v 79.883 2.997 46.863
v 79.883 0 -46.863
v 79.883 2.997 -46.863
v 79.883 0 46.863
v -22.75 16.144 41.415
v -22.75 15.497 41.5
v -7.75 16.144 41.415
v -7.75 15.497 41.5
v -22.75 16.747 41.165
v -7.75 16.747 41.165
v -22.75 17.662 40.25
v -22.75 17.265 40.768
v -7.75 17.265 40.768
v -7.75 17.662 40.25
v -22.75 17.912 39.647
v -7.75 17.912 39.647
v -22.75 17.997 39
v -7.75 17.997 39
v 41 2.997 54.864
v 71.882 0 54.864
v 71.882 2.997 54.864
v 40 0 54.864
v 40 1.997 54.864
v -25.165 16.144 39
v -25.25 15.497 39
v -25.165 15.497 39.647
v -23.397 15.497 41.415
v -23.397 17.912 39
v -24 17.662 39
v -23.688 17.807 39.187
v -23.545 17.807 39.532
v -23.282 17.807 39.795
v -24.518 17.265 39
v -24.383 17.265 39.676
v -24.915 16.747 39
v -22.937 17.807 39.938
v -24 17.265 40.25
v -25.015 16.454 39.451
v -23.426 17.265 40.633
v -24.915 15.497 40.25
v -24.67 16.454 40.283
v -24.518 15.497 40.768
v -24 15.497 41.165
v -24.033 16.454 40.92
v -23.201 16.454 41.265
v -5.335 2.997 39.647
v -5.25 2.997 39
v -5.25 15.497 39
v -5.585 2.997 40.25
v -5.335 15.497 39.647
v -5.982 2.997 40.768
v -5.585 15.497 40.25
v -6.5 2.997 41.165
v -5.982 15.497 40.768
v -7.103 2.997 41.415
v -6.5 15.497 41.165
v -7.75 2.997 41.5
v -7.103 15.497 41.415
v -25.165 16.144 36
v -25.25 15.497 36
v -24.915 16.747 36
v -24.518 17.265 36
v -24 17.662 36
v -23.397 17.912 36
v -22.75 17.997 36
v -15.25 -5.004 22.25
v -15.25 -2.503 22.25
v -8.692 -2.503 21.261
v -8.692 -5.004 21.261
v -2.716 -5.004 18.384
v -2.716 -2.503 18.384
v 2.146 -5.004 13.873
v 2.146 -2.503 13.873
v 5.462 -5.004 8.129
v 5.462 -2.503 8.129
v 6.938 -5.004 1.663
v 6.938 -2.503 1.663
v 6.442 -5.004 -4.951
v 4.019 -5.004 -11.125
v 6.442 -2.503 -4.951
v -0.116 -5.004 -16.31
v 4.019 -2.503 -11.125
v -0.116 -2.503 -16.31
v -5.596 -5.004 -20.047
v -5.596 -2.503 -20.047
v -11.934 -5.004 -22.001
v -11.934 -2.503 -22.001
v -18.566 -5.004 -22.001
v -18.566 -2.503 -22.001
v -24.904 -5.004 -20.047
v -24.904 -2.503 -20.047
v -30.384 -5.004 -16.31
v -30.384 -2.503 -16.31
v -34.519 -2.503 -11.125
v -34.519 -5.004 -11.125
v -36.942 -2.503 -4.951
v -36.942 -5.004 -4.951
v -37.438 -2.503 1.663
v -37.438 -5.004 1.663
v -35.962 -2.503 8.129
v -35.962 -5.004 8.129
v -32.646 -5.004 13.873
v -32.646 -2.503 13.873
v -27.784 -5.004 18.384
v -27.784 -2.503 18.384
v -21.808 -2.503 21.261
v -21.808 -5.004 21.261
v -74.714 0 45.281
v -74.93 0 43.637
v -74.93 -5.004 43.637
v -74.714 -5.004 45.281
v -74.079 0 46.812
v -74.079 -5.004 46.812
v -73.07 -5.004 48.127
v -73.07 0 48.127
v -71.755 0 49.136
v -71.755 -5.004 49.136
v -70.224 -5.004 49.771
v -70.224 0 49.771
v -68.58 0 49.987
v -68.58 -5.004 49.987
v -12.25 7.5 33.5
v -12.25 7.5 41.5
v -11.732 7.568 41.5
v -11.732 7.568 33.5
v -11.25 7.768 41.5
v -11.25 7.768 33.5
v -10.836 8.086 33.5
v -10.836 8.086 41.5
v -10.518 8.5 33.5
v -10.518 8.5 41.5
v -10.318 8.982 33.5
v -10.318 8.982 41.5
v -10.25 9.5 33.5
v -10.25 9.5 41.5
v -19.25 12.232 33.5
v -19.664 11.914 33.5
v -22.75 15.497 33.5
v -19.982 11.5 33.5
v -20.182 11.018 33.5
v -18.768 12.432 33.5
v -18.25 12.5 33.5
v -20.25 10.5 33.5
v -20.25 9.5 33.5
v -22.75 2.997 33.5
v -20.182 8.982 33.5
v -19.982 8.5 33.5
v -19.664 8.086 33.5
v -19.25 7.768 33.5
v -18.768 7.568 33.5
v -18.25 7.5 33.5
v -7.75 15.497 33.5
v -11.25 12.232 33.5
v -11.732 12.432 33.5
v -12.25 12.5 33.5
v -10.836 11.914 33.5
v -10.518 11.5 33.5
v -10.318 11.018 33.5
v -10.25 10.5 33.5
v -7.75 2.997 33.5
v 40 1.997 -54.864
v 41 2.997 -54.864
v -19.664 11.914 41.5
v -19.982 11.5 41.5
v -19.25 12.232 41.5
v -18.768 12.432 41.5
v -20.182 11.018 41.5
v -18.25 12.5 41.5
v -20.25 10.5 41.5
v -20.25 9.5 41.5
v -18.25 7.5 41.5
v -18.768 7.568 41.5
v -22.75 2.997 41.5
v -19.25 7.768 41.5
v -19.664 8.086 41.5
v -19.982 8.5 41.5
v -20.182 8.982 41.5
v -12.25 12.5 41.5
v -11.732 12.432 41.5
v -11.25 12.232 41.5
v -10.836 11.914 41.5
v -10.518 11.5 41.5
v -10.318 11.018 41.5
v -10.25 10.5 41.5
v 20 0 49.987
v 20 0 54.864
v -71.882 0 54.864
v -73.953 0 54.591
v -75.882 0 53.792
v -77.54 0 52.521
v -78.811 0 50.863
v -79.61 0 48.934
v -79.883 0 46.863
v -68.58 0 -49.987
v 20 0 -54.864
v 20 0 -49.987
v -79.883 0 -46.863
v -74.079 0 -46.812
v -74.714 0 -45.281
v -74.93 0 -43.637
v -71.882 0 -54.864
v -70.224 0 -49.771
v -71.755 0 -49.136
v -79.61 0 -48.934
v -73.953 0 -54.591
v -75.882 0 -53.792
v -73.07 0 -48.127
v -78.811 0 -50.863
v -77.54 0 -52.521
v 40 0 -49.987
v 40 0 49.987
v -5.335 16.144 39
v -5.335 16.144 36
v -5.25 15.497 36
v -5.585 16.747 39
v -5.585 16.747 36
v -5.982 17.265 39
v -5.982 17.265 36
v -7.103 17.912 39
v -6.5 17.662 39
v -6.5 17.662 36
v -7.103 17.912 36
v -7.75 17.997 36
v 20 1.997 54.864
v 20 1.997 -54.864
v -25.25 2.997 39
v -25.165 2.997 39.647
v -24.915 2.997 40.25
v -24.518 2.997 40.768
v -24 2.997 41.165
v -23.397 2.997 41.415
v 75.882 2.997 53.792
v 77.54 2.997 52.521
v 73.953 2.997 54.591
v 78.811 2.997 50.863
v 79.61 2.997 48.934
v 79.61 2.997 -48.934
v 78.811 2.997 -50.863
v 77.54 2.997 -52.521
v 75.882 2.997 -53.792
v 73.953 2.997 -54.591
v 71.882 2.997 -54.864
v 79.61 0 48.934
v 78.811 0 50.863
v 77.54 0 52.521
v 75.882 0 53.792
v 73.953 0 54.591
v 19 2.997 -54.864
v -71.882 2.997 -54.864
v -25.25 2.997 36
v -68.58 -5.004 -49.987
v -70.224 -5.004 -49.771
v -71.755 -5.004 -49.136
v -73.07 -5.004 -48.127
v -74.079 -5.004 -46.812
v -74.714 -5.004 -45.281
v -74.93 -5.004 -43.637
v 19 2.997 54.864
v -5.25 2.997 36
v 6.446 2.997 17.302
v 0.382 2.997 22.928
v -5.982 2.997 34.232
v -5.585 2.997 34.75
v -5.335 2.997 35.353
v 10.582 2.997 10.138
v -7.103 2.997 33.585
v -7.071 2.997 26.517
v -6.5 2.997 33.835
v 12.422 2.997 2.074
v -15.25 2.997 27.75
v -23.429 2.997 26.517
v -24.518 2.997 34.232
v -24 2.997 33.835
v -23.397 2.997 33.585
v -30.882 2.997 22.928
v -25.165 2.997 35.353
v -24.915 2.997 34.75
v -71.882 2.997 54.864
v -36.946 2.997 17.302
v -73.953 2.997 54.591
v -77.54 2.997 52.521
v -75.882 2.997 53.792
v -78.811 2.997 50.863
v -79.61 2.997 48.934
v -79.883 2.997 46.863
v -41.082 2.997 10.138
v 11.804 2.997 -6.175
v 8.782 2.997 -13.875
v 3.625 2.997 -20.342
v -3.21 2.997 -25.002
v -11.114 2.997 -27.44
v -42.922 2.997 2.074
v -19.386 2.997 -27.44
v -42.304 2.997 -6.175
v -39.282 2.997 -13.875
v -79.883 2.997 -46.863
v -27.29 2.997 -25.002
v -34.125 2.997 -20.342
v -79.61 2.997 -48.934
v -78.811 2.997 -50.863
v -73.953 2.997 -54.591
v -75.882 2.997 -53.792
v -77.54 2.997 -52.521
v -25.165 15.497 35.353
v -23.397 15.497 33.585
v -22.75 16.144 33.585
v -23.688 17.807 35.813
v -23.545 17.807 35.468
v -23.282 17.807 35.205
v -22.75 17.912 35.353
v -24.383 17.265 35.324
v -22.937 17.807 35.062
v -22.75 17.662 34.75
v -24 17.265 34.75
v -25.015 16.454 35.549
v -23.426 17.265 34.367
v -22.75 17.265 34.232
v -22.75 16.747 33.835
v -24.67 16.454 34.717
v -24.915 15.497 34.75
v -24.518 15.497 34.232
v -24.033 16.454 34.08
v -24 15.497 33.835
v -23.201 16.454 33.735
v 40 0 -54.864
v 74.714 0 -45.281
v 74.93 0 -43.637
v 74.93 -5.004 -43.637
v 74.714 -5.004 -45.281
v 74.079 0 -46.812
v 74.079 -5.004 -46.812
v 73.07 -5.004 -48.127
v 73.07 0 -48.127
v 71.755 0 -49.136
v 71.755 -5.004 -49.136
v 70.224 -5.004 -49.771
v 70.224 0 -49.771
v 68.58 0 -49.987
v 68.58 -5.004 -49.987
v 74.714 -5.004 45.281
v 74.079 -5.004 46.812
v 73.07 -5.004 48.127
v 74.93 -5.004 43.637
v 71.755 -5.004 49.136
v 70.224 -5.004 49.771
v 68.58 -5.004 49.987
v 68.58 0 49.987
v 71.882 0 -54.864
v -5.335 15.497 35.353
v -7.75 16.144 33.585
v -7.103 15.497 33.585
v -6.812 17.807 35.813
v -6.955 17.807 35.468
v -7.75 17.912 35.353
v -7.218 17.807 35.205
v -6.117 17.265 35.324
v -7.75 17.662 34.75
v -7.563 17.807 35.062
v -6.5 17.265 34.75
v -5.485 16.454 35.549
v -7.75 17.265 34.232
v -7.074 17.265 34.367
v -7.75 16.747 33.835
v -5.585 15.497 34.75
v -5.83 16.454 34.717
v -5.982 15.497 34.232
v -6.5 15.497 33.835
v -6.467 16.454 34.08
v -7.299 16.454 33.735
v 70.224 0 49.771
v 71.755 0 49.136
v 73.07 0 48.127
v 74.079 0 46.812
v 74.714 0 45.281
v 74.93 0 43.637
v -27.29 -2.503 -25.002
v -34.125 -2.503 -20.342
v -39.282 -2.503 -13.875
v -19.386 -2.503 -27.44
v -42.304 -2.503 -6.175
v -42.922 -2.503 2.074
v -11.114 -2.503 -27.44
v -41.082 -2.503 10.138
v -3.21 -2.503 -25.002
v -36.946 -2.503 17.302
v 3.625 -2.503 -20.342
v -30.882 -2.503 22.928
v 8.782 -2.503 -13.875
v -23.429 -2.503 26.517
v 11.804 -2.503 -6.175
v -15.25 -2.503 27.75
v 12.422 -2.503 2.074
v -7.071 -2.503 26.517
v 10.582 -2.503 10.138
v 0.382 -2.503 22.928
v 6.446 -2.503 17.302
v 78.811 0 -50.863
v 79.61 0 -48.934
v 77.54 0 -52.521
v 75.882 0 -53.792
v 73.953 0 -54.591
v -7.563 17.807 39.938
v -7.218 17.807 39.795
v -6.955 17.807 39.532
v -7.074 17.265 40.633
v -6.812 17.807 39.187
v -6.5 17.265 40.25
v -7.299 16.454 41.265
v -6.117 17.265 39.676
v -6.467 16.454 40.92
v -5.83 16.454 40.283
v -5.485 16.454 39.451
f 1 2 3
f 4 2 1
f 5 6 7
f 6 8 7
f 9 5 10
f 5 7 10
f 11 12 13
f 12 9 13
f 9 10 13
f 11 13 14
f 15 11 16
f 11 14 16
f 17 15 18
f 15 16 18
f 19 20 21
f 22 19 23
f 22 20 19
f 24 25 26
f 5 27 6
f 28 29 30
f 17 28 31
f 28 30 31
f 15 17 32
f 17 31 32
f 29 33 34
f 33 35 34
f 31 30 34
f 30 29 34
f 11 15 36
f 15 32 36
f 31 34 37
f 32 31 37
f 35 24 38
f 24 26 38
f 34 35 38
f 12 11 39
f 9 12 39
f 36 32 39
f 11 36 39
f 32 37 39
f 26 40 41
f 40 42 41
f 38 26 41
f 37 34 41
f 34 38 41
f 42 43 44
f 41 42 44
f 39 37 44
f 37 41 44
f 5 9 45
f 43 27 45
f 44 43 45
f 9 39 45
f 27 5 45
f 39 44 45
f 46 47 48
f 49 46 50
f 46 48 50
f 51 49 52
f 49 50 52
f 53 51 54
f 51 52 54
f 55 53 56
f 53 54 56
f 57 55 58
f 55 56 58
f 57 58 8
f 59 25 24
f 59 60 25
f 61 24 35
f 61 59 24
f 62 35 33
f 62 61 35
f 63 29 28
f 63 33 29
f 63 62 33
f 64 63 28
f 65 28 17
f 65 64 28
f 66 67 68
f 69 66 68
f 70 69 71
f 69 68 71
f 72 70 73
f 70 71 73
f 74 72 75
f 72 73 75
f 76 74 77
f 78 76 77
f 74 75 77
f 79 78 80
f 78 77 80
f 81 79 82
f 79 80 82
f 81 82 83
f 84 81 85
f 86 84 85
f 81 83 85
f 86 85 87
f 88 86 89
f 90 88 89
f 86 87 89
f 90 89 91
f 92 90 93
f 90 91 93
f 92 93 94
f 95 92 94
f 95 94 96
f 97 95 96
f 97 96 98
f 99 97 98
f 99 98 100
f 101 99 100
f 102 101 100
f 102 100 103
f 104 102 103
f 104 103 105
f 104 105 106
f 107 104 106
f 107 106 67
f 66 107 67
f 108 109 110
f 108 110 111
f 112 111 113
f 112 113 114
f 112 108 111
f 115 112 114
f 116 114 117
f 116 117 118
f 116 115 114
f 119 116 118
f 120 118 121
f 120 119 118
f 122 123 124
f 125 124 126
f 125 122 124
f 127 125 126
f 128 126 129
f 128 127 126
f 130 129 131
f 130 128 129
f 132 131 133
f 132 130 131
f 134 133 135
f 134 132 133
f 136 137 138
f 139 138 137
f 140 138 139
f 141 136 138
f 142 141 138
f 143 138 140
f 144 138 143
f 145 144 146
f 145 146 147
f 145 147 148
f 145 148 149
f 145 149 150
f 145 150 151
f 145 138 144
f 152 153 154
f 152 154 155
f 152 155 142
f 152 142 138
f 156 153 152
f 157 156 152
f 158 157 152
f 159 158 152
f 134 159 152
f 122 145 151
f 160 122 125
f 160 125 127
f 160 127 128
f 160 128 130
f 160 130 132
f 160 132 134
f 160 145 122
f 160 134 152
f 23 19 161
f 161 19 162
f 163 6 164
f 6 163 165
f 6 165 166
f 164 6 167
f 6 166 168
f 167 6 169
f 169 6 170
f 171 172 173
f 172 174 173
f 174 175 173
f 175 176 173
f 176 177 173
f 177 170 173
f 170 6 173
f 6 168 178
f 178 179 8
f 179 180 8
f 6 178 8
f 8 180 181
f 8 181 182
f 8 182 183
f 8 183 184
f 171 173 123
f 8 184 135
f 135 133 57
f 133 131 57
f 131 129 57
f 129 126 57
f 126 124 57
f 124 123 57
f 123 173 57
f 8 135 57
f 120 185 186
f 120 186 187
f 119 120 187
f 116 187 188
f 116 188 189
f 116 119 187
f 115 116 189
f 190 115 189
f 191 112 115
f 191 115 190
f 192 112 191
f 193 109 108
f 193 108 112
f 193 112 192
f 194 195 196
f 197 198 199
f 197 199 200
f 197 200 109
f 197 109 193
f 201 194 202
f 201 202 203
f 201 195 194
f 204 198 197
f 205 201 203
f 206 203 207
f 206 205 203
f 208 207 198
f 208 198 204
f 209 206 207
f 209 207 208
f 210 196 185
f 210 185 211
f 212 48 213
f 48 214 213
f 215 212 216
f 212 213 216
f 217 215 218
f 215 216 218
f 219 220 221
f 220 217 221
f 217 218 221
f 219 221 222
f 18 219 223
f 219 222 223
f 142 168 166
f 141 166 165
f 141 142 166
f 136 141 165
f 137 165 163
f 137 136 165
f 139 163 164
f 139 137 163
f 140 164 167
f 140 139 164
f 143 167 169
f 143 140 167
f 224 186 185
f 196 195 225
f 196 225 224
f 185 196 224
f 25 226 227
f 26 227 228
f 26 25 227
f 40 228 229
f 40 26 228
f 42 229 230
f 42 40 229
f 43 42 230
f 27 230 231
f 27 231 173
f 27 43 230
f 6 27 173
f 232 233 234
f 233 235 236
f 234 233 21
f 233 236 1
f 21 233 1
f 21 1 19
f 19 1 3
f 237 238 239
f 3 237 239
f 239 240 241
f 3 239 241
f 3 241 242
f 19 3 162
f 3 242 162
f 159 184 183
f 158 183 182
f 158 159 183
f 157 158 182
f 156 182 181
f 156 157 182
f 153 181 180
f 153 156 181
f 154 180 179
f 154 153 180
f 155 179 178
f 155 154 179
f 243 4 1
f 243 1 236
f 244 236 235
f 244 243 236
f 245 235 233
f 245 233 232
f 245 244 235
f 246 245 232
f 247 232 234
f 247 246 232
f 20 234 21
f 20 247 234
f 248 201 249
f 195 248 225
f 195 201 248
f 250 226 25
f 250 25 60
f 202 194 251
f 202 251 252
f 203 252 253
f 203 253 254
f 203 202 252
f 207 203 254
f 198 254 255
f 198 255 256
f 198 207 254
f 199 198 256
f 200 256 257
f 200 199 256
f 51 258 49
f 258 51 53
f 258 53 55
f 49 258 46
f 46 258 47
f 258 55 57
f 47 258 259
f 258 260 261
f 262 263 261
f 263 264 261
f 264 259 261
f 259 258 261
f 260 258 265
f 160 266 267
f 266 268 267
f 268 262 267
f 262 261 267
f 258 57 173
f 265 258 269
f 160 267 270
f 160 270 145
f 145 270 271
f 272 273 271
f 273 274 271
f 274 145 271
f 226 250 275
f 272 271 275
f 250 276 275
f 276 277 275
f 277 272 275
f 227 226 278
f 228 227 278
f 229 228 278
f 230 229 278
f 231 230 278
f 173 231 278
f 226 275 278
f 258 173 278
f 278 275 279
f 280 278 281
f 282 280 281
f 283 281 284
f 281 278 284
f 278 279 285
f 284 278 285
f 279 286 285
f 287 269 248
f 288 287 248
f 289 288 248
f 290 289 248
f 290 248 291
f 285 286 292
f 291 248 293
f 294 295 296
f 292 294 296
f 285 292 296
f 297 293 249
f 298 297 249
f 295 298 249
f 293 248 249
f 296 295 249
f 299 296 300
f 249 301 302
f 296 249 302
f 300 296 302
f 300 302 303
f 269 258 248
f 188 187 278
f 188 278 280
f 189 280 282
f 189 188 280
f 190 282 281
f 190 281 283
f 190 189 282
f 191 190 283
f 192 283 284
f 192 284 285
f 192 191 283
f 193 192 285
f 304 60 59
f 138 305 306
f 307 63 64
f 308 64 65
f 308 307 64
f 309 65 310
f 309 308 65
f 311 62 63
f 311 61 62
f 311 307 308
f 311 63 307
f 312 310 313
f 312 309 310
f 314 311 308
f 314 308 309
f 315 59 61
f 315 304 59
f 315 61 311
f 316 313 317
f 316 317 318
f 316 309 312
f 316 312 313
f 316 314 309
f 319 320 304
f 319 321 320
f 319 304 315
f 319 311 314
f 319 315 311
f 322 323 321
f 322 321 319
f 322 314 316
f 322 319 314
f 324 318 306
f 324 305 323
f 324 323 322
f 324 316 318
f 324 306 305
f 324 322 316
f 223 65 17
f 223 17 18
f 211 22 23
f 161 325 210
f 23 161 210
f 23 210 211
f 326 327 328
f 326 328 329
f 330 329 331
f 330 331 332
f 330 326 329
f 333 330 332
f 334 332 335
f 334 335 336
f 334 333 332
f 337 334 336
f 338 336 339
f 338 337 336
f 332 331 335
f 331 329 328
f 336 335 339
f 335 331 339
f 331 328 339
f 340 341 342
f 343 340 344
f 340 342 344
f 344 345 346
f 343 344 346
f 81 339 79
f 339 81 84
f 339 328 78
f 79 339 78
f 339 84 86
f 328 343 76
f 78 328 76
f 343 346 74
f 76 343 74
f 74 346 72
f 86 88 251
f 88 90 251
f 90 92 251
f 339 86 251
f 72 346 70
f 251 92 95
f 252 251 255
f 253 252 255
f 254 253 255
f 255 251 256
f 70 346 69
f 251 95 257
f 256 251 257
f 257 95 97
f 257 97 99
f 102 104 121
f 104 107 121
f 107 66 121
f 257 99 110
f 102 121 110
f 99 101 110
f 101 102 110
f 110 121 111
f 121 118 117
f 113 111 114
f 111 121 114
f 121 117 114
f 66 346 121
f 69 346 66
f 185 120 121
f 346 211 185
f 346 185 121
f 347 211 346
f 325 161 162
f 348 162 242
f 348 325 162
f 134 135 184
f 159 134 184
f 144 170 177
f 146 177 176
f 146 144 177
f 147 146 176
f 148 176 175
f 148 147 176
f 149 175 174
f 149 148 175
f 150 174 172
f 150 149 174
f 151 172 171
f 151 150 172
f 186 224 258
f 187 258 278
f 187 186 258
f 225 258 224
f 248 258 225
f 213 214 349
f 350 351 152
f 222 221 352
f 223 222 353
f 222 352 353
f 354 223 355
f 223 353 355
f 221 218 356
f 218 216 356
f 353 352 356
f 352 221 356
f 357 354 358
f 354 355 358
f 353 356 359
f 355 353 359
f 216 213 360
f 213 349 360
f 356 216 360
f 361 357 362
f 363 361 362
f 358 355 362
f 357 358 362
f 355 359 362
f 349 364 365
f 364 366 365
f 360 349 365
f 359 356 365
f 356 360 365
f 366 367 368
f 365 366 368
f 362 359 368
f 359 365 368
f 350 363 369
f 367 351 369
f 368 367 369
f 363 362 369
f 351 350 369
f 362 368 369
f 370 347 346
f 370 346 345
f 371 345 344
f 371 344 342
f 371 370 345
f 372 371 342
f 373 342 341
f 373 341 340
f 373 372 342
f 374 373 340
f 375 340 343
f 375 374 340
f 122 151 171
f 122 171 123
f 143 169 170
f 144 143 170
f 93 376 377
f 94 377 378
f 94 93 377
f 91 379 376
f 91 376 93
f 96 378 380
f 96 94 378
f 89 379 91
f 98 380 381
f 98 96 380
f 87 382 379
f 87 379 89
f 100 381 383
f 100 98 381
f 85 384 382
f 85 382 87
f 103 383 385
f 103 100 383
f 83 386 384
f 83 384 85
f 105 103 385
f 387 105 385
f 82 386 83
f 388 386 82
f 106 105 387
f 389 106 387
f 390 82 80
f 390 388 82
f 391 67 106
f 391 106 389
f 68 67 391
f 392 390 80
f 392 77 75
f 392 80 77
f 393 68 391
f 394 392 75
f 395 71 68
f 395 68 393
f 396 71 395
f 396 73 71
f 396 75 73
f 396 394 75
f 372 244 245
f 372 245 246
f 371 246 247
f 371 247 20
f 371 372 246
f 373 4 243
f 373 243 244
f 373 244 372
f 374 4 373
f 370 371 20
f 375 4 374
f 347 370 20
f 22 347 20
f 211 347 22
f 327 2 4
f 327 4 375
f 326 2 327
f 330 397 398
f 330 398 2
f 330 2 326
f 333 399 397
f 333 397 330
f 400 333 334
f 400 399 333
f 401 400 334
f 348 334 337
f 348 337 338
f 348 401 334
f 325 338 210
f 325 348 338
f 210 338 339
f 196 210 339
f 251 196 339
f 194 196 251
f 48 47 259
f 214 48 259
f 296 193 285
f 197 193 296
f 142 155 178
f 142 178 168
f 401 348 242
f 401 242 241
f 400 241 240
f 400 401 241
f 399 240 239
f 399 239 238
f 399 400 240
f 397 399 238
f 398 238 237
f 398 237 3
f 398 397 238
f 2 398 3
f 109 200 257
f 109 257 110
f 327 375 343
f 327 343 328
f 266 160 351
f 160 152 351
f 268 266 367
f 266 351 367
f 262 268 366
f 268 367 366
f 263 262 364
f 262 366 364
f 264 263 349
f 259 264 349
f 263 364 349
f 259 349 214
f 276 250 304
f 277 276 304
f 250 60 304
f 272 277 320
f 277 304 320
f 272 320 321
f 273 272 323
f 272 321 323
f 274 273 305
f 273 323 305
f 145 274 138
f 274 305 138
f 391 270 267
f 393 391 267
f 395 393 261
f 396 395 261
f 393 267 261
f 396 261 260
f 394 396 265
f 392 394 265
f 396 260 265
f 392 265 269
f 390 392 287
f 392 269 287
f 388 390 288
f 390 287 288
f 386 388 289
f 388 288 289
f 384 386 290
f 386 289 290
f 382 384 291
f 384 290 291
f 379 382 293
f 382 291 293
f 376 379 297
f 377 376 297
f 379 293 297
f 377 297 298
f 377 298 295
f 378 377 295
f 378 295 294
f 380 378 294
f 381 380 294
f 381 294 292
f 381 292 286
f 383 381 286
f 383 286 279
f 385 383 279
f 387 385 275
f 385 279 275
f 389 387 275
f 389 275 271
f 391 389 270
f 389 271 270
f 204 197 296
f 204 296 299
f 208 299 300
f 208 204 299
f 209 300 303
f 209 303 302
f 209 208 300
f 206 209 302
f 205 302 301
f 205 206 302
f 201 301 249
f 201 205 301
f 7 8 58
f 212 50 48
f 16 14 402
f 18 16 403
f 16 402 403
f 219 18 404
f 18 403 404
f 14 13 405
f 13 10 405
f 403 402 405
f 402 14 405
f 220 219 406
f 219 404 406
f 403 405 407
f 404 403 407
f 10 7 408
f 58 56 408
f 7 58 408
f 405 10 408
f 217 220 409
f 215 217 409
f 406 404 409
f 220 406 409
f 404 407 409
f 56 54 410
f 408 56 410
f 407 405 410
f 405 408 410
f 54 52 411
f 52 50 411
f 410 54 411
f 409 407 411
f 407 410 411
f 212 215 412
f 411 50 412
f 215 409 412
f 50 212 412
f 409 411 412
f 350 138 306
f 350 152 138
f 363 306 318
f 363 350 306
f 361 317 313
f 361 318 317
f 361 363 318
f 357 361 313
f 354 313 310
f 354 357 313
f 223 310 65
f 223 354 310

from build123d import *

# Parameters (mm, degrees)
EXTRUDE1_DEPTH          = 2.9972
EXTRUDE2_DEPTH          = 5.0038
SKETCH3_R               = 27.75
EXTRUDE3_DEPTH          = 5.5
SKETCH5_R               = 22.25
EXTRUDE4_DEPTH          = 98.06493798
CUT_EXTRUDE1_DEPTH      = 60
CUT_EXTRUDE1_DEPTH_BACK = 60
SKETCH6_W               = 20
SKETCH6_H               = 3
CHAMFER1_SIZE           = 1
SKETCH7_W               = 20
SKETCH7_H               = 8
BOSS_EXTRUDE1_DEPTH     = 15
FILLET1_R               = 2.5
CUT_EXTRUDE2_DEPTH      = 15


with BuildPart() as part:
    # Sketch1 → Extrude1 (new body)
    with BuildSketch(Plane(origin=(0, 0, 0), x_dir=(1, 0, 0), z_dir=(0, 1, 0))):
        with BuildLine():
            Line((-71.882, 54.864), (71.882, 54.864))
            ThreePointArc((71.882, 54.864), (77.539561356, 52.520561356), (79.883, 46.863))
            Line((79.883, 46.863), (79.883, -46.863))
            ThreePointArc((79.883, -46.863), (77.539561356, -52.520561356), (71.882, -54.864))
            Line((71.882, -54.864), (-71.882, -54.864))
            ThreePointArc((-71.882, -54.864), (-77.539561356, -52.520561356), (-79.883, -46.863))
            Line((-79.883, -46.863), (-79.883, 46.863))
            ThreePointArc((-79.883, 46.863), (-77.539561356, 52.520561356), (-71.882, 54.864))
        make_face()
    extrude(amount=EXTRUDE1_DEPTH)

    # Sketch2 → Extrude2 (add)
    with BuildSketch(Plane.XZ):
        with BuildLine():
            Line((68.58, -49.9872), (-68.58, -49.9872))
            ThreePointArc((-68.58, -49.9872), (-73.070128061, -48.127328061), (-74.93, -43.6372))
            Line((-74.93, -43.6372), (-74.93, 43.6372))
            ThreePointArc((-74.93, 43.6372), (-73.070128061, 48.127328061), (-68.58, 49.9872))
            Line((-68.58, 49.9872), (68.58, 49.9872))
            ThreePointArc((68.58, 49.9872), (73.070128061, 48.127328061), (74.93, 43.6372))
            Line((74.93, 43.6372), (74.93, -43.6372))
            ThreePointArc((74.93, -43.6372), (73.070128061, -48.127328061), (68.58, -49.9872))
        make_face()
    extrude(amount=EXTRUDE2_DEPTH)

    # Sketch3 → Extrude3 (cut)
    with BuildSketch(Plane(origin=(0, 2.9972, 0), x_dir=(1, 0, 0), z_dir=(0, 1, 0))):
        with Locations(Location((-15.25, 0, 0), (0, 0, 270))):
            Circle(SKETCH3_R)
    extrude(amount=-EXTRUDE3_DEPTH, mode=Mode.SUBTRACT)

    # Sketch5 → Extrude4 (cut, through all)
    with BuildSketch(Plane(origin=(0, -2.5028, 0), x_dir=(1, 0, 0), z_dir=(0, 1, 0))):
        with Locations(Location((-15.25, 0, 0), (0, 0, 270))):
            Circle(SKETCH5_R)
    extrude(amount=-EXTRUDE4_DEPTH, mode=Mode.SUBTRACT)

    # Sketch6 → Cut-Extrude1 (cut, two sides: drawn at the far end of the back side and taken through both)
    with BuildSketch(Plane.XY.offset(-CUT_EXTRUDE1_DEPTH_BACK)):
        with Locations((30, 1.5)):
            Rectangle(SKETCH6_W, SKETCH6_H)
    extrude(amount=CUT_EXTRUDE1_DEPTH + CUT_EXTRUDE1_DEPTH_BACK, mode=Mode.SUBTRACT)

    # Chamfer1
    chamfer1_edges = [part.edges().sort_by_distance(p)[0] for p in [
        (20, 2.9972, 0),
        (40, 2.9972, 0),
    ]]
    chamfer(chamfer1_edges, length=CHAMFER1_SIZE)

    # Sketch7 → Boss-Extrude1 (add)
    with BuildSketch(Plane(origin=(0, 2.9972, 0), x_dir=(1, 0, 0), z_dir=(0, 1, 0))):
        with Locations((-15.25, -37.5)):
            Rectangle(SKETCH7_W, SKETCH7_H)
    extrude(amount=BOSS_EXTRUDE1_DEPTH)

    # Fillet1
    fillet1_edges = [part.edges().sort_by_distance(p)[0] for p in [
        (-25.25, 10.4972, 33.5),
        (-25.25, 10.4972, 41.5),
        (-5.25, 10.4972, 41.5),
        (-5.25, 10.4972, 33.5),
        (-25.25, 17.9972, 37.5),
        (-15.25, 17.9972, 41.5),
        (-5.25, 17.9972, 37.5),
        (-15.25, 17.9972, 33.5),
    ]]
    fillet(fillet1_edges, radius=FILLET1_R)

    # Sketch8 → Cut-Extrude2 (cut)
    with BuildSketch(Plane(origin=(0, 0, 33.5), x_dir=(-1, 0, 0), z_dir=(0, 0, -1))):
        with BuildLine():
            Line((12.25, 12.5), (18.25, 12.5))
            ThreePointArc((18.25, 12.5), (19.664213562, 11.914213562), (20.25, 10.5))
            Line((20.25, 10.5), (20.25, 9.5))
            ThreePointArc((20.25, 9.5), (19.664213562, 8.085786438), (18.25, 7.5))
            Line((18.25, 7.5), (12.25, 7.5))
            ThreePointArc((12.25, 7.5), (10.835786438, 8.085786438), (10.25, 9.5))
            Line((10.25, 9.5), (10.25, 10.5))
            ThreePointArc((10.25, 10.5), (10.835786438, 11.914213562), (12.25, 12.5))
        make_face()
    extrude(amount=-CUT_EXTRUDE2_DEPTH, mode=Mode.SUBTRACT)


solid = part.part
